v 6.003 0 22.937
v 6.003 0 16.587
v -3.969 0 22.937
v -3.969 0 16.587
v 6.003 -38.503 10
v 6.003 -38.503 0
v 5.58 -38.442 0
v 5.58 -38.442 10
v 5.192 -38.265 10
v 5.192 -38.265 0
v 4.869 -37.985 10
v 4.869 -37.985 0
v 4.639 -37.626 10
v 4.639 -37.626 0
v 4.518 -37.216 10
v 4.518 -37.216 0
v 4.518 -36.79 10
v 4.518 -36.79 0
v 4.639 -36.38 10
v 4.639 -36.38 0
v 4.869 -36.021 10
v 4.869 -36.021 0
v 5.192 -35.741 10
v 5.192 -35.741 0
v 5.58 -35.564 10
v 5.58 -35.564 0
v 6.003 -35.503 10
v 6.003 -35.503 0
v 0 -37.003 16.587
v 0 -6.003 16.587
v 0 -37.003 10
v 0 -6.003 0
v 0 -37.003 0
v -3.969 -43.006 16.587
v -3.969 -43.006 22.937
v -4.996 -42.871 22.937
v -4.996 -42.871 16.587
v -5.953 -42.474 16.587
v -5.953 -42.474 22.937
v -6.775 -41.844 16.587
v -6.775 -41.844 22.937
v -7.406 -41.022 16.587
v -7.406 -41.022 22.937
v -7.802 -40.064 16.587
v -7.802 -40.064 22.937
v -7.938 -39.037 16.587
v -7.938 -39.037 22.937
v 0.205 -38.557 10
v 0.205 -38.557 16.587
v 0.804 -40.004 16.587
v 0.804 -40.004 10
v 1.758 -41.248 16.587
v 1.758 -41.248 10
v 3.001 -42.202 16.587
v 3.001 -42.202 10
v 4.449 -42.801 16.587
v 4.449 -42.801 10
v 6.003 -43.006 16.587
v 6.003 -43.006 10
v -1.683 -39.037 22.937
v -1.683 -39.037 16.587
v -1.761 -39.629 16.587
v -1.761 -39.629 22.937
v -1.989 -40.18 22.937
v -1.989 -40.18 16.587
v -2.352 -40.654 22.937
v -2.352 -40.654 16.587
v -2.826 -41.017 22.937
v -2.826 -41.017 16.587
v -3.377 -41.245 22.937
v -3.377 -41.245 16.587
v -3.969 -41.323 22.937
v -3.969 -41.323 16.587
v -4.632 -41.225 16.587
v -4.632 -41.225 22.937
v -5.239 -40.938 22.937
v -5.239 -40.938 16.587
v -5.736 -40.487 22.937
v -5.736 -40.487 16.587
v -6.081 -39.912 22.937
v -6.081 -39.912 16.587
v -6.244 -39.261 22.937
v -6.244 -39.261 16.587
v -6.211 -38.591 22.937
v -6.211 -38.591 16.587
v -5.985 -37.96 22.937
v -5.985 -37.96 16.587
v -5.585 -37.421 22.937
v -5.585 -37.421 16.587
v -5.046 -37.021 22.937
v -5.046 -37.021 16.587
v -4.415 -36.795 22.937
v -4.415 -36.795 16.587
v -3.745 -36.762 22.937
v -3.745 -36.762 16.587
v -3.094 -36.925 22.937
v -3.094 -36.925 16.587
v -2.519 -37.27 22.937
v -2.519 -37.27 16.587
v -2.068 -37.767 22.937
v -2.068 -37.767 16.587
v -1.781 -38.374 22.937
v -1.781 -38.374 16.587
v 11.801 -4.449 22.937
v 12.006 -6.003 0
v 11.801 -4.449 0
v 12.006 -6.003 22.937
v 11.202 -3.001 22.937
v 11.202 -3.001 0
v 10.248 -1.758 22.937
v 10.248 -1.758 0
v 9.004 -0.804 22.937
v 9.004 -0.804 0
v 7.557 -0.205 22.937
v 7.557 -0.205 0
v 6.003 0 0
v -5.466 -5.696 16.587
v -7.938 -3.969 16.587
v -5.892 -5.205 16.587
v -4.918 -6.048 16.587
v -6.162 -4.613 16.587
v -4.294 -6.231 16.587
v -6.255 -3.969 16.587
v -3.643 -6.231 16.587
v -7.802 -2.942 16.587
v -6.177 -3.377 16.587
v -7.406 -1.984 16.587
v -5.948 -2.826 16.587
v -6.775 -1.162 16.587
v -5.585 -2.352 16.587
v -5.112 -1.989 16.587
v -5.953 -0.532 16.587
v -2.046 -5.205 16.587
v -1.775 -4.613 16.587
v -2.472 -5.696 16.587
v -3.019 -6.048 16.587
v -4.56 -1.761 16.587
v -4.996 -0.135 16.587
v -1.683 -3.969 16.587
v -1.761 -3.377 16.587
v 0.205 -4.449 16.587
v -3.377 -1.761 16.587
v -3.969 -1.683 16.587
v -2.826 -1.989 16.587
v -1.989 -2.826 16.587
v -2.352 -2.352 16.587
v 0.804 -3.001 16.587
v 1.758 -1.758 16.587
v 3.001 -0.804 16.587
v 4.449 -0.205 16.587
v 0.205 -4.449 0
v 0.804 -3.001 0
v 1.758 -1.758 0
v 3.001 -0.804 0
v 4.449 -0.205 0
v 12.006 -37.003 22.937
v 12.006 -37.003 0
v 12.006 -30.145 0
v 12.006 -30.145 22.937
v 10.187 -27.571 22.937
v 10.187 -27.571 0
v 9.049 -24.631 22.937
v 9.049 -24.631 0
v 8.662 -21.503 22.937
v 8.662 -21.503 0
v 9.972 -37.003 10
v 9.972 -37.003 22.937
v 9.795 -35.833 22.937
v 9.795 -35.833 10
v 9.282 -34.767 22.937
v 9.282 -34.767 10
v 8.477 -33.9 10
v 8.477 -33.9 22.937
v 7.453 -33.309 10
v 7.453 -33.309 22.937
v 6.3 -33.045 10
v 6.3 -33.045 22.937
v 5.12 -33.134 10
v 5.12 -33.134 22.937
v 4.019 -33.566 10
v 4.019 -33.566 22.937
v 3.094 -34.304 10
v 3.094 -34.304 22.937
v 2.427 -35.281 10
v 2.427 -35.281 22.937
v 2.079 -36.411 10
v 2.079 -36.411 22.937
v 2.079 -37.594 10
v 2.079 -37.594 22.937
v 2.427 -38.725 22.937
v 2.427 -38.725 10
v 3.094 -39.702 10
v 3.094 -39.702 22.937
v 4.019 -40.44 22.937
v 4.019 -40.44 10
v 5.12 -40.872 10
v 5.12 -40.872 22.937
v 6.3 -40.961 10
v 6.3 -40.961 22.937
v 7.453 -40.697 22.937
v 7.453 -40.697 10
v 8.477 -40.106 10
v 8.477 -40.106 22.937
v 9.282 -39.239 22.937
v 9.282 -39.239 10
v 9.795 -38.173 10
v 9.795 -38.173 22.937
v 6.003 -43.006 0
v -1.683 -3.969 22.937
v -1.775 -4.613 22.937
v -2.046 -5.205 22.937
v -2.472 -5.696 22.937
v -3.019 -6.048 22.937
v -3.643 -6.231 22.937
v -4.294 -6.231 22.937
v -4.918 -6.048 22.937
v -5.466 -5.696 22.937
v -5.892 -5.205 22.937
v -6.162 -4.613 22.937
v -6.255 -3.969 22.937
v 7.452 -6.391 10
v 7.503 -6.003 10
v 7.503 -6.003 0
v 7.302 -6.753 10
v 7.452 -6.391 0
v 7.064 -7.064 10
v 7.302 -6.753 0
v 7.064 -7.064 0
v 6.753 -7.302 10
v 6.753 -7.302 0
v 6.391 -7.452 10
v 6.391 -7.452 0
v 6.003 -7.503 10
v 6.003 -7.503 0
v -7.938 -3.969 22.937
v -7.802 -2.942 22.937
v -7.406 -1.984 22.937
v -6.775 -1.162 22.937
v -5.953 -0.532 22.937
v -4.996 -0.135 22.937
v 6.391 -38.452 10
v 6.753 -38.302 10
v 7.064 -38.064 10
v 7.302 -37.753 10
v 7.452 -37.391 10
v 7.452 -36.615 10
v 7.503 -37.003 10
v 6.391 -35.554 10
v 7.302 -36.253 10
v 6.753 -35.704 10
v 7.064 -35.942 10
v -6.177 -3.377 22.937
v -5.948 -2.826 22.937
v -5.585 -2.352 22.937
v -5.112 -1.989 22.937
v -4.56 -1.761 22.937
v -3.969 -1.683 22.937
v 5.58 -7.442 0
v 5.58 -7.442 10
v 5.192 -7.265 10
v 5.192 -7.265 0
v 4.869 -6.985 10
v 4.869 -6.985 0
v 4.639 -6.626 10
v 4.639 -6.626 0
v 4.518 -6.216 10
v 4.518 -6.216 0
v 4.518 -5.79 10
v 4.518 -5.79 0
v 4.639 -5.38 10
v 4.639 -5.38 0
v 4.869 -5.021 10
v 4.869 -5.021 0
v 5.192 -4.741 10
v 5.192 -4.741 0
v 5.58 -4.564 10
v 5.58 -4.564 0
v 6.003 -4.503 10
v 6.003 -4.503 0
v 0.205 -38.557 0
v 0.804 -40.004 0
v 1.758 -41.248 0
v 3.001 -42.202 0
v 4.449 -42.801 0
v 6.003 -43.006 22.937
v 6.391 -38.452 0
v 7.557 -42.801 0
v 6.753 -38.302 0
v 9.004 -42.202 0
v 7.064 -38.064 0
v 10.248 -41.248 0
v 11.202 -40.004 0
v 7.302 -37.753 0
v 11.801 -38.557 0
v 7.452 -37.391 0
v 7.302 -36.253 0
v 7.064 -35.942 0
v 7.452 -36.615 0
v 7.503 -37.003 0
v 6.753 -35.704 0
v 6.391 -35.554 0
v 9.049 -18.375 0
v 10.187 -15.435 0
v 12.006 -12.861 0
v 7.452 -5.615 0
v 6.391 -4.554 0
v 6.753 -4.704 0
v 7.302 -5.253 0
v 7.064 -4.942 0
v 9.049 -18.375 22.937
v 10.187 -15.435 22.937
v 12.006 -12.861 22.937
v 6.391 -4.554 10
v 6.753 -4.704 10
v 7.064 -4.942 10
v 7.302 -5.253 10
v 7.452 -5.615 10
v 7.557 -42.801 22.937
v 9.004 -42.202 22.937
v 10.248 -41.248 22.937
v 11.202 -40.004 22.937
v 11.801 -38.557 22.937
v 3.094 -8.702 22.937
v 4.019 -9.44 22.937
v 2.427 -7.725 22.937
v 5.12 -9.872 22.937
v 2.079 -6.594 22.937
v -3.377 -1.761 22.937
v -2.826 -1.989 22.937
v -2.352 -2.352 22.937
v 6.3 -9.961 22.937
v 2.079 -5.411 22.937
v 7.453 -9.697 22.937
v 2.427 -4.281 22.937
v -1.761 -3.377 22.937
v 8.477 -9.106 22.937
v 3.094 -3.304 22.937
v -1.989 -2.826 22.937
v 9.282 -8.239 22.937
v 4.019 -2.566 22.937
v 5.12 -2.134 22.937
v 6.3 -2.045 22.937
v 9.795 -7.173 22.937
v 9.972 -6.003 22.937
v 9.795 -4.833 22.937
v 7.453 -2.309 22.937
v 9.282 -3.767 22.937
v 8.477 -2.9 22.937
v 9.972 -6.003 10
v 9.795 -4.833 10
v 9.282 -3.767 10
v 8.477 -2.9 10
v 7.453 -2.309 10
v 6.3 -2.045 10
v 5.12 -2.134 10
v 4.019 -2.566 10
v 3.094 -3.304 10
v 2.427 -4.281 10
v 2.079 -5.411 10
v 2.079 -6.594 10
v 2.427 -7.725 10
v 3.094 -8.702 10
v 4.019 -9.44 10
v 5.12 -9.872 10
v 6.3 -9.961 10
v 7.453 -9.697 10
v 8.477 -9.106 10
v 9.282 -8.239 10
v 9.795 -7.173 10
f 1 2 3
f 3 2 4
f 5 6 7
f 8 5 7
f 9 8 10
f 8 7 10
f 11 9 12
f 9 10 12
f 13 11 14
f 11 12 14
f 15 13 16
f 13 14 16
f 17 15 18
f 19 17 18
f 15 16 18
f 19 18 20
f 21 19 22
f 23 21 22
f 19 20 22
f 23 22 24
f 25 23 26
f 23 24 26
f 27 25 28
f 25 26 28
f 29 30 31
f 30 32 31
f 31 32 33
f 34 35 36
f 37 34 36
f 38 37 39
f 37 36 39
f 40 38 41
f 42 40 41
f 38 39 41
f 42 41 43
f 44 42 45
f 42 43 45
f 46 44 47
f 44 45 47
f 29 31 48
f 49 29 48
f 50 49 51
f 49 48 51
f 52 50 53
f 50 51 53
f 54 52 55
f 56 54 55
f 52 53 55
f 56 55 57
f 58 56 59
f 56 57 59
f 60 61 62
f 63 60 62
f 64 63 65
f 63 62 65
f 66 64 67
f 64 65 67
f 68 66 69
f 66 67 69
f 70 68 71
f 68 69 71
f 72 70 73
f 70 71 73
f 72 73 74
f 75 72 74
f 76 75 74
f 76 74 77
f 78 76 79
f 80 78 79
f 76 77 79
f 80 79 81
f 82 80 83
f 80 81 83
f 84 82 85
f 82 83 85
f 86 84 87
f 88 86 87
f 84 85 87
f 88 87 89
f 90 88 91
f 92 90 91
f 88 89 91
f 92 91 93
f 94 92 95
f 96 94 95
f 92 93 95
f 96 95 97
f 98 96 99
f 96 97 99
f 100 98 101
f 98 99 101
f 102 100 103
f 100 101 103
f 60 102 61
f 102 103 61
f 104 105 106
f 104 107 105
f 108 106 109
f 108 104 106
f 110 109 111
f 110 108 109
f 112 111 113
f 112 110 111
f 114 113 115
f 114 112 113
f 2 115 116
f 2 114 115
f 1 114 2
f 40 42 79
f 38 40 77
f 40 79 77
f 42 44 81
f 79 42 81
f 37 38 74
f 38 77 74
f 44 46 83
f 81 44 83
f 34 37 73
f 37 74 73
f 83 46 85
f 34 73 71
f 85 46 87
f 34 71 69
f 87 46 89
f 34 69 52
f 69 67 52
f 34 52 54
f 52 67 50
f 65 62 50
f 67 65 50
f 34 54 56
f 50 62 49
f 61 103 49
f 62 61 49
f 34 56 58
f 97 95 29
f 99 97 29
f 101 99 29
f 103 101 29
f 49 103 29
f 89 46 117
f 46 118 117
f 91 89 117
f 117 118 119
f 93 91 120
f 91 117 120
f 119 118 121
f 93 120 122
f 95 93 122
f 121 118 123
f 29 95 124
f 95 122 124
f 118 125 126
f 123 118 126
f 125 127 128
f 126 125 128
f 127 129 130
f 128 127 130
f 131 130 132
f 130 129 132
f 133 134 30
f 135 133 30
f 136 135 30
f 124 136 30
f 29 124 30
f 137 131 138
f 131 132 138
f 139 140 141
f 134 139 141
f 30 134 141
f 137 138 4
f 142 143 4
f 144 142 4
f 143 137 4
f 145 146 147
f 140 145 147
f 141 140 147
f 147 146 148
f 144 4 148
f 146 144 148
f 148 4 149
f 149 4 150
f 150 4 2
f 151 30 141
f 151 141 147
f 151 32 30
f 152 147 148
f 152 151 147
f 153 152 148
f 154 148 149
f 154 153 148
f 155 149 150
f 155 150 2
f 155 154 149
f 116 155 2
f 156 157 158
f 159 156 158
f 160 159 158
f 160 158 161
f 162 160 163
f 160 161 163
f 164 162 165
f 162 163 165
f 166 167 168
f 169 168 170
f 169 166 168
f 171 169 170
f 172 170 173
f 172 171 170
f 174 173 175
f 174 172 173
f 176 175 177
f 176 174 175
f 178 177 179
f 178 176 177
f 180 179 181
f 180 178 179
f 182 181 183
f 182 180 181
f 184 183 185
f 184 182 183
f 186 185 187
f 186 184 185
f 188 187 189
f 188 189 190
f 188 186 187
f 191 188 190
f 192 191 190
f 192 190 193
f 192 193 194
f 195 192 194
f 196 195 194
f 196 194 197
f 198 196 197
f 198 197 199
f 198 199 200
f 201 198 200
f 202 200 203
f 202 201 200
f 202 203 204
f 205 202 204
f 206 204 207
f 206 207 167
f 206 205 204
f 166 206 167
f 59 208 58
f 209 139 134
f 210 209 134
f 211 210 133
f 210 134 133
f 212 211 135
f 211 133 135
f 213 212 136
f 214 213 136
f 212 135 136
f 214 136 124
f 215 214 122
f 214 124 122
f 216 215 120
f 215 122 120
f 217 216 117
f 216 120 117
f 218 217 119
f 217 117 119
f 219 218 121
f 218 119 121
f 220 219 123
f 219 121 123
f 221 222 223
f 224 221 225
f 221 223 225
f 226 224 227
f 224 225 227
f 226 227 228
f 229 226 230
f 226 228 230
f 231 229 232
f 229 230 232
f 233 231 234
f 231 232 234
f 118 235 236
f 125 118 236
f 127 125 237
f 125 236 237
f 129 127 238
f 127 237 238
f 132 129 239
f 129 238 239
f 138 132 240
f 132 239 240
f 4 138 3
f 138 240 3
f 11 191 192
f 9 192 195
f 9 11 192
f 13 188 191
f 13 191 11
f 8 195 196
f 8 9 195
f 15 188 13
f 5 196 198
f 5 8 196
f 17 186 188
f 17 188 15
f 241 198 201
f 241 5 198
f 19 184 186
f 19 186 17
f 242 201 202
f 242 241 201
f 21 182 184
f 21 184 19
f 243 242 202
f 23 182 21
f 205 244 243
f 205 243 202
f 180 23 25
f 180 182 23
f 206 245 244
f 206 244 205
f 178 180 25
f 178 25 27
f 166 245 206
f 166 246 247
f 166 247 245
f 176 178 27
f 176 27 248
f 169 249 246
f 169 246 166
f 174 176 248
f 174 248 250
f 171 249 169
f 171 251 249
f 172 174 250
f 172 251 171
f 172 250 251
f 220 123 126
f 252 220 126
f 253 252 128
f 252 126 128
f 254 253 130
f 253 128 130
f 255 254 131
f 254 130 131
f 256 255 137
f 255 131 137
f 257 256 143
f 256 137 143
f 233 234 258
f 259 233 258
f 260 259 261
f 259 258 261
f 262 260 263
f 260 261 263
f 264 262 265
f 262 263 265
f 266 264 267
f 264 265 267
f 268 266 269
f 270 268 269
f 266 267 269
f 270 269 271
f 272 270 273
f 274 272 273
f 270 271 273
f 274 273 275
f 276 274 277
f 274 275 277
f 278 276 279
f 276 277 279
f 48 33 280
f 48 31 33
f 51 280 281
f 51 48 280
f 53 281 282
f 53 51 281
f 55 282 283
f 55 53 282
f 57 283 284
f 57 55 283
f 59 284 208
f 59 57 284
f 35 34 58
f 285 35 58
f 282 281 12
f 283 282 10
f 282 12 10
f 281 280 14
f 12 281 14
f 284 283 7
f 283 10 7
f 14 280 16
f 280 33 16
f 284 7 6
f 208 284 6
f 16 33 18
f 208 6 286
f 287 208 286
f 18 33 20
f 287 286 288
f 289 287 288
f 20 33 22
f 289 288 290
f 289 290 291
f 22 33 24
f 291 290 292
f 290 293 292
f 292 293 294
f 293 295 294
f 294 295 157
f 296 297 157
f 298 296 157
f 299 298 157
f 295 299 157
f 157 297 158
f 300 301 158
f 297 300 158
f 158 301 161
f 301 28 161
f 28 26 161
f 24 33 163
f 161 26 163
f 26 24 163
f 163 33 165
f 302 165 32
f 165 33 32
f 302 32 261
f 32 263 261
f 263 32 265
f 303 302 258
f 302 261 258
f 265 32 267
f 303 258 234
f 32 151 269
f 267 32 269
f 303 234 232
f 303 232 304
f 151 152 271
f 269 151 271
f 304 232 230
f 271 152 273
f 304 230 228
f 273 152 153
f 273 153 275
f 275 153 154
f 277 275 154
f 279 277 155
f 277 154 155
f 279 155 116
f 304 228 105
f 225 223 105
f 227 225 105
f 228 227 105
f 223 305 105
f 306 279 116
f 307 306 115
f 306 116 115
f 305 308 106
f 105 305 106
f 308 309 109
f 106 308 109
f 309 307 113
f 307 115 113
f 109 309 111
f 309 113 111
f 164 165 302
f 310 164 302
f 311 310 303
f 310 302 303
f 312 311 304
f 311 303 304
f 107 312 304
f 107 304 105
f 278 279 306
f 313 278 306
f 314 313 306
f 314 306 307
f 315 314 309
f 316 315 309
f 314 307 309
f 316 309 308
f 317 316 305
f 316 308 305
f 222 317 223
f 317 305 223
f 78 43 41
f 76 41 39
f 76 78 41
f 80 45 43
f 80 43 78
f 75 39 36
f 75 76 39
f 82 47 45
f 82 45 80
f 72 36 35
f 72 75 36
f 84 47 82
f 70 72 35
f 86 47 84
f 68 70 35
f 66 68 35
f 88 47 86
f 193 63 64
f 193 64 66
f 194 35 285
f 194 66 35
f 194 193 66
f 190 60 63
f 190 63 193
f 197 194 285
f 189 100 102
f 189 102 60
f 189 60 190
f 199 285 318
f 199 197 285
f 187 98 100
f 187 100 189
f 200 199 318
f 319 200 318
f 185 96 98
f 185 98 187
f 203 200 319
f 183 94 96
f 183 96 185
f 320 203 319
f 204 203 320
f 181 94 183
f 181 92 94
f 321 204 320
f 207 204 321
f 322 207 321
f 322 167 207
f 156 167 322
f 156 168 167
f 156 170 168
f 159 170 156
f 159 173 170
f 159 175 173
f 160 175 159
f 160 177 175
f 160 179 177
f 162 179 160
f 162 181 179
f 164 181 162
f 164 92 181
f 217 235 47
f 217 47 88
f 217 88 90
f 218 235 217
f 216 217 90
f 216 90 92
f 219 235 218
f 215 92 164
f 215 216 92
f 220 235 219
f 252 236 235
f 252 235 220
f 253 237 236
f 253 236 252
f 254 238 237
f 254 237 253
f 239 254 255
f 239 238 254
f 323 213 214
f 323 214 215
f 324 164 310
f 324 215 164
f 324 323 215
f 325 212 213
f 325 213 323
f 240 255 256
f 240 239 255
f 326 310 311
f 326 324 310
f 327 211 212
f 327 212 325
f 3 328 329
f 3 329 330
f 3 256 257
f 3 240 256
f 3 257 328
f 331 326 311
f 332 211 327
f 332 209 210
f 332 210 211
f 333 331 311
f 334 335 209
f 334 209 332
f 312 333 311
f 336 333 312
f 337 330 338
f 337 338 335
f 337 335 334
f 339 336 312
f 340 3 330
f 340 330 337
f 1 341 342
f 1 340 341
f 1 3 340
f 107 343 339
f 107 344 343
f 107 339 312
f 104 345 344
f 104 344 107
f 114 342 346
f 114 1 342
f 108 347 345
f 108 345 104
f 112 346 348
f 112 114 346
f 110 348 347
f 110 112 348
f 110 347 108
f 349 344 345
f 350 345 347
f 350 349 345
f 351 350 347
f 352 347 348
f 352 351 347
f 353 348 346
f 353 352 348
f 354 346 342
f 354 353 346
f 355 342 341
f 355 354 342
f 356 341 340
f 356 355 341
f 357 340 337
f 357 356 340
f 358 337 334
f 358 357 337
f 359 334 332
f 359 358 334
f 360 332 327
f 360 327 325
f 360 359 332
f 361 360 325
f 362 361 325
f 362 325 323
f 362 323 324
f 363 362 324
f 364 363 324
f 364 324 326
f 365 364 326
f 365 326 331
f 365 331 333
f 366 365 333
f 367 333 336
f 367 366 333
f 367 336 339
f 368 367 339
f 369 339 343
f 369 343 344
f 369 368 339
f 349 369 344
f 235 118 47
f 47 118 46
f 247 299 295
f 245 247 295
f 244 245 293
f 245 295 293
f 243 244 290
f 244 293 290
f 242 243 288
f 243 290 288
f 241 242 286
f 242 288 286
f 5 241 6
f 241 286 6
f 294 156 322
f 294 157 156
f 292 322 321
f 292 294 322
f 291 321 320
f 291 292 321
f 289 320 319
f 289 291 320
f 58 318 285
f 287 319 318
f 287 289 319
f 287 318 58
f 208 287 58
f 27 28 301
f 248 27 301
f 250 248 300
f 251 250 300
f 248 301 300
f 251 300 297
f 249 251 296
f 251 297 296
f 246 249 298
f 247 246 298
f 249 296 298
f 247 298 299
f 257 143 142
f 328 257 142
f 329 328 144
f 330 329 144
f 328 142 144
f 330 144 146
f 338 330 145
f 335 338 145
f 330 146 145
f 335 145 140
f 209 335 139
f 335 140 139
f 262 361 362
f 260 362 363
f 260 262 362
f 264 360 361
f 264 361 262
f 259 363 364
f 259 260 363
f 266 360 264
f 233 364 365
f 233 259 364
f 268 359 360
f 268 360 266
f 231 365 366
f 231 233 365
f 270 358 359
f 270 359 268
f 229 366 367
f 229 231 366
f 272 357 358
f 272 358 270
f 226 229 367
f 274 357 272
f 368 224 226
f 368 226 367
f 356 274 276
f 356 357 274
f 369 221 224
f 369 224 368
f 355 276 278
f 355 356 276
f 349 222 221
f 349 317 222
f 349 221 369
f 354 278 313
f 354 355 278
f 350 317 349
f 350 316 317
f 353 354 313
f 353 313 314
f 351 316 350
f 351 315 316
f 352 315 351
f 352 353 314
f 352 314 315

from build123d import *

# Parameters (mm, degrees)
F1_DEPTH = 10
F2_R     = 3.96875
F3_DEPTH = 12.93749
F4_R     = 6.002975
F5_R     = 3.96875
F7_DEPTH = 22.93749
F8_DEPTH = 6.58749


# Not quite as in the source:
# - a fillet or chamfer is up to 0.001 mm smaller than in the source, because OpenCascade refuses the exact size


with BuildPart() as f1:
    # F0 (on Top) → F1 (new body)
    with BuildSketch(Plane.XY):
        Polygon((6.0029852, 0), (0, 0), (0, -43.0059592), (6.0029852, -43.0059592), (12.0059704, -43.0059592), (12.0059704, 0), align=None)
        with BuildLine():
            ThreePointArc((7.5029852, -37.002974), (7.0636453718, -38.0636341718), (6.0029852, -38.502974))
            ThreePointArc((6.0029852, -38.502974), (4.5029852, -37.002974), (6.0029852, -35.502974))
            ThreePointArc((6.0029852, -35.502974), (7.0636453718, -35.9423138282), (7.5029852, -37.002974))
        make_face(mode=Mode.SUBTRACT)
        with BuildLine():
            ThreePointArc((6.0029852, -7.5029852), (4.5029852, -6.0029852), (6.0029852, -4.5029852))
            ThreePointArc((6.0029852, -4.5029852), (7.0636453718, -4.9423250282), (7.5029852, -6.0029852))
            ThreePointArc((7.5029852, -6.0029852), (7.0636453718, -7.0636453718), (6.0029852, -7.5029852))
        make_face(mode=Mode.SUBTRACT)
    extrude(amount=F1_DEPTH)

    # F2 (on face) → F3 (join)
    with BuildSketch(Plane.XY.offset(10)):
        with BuildLine():
            Line((12.0059704, -43.0059592), (12.0059704, 0))
            Line((12.0059704, 0), (-3.96875, 0))
            Line((-3.96875, 0), (-3.96875, -1.68275))
            ThreePointArc((-3.96875, -1.68275), (-2.3523038982, -2.3523038982), (-1.68275, -3.96875))
            ThreePointArc((-1.68275, -3.96875), (-3.96875, -6.25475), (-6.25475, -3.96875))
            Line((-6.25475, -3.96875), (-7.9375, -3.96875))
            Line((-7.9375, -3.96875), (-7.9375, -43.0059592))
            Line((-7.9375, -43.0059592), (-3.96875, -43.0059592))
            Line((-3.96875, -43.0059592), (12.0059704, -43.0059592))
        make_face()
        with BuildLine():
            ThreePointArc((-1.68275, -39.0372092), (-2.3523038982, -40.6536553018), (-3.96875, -41.3232092))
            ThreePointArc((-3.96875, -41.3232092), (-5.5851961018, -37.4207630982), (-1.68275, -39.0372092))
        make_face(mode=Mode.SUBTRACT)
        with Locations((6.0029852, -37.002974)):
            Circle(F2_R, mode=Mode.SUBTRACT)
        with Locations((6.0029852, -6.0029852)):
            Circle(F2_R, mode=Mode.SUBTRACT)
        with BuildLine():
            Line((-3.96875, -1.68275), (-3.96875, 0))
            Line((-3.96875, 0), (-7.9375, 0))
            Line((-7.9375, 0), (-7.9375, -3.96875))
            Line((-7.9375, -3.96875), (-6.25475, -3.96875))
            ThreePointArc((-6.25475, -3.96875), (-5.5851961018, -2.3523038982), (-3.96875, -1.68275))
        make_face()
    extrude(amount=F3_DEPTH)

    # F4 (radius 6.0029852 in the source; OpenCascade refuses exactly that, so slightly less here)
    f4_edges = [f1.edges().sort_by_distance(p)[0] for p in [
        (12.00597, 0, 11.468745),
        (0, 0, 5),
        (0, -43.005959, 5),
        (12.00597, -43.005959, 11.468745),
    ]]
    fillet(f4_edges, radius=F4_R)

    # F5
    f5_edges = [f1.edges().sort_by_distance(p)[0] for p in [
        (-7.9375, -43.005959, 16.468745),
        (-7.9375, 0, 16.468745),
    ]]
    fillet(f5_edges, radius=F5_R)

    # F6 (on face) → F7 (cut, through all)
    with BuildSketch(Plane(origin=(0, 0, 0), x_dir=(1, 0, 0), z_dir=(0, 0, -1))):
        with BuildLine():
            ThreePointArc((12.0059704, 30.145029001), (9.5274974569, 26.1361174223), (8.6624922, 21.5029796))
            Line((8.6624922, 21.5029796), (12.0059704, 21.5029796))
            Line((12.0059704, 21.5029796), (12.0059704, 30.145029001))
        make_face()
        with BuildLine():
            Line((12.0059704, 21.5029796), (8.6624922, 21.5029796))
            ThreePointArc((8.6624922, 21.5029796), (9.5274974569, 16.8698417777), (12.0059704, 12.860930199))
            Line((12.0059704, 12.860930199), (12.0059704, 21.5029796))
        make_face()
    extrude(amount=-F7_DEPTH, mode=Mode.SUBTRACT)

    # F8 (cut): a face of the model
    f8_faces = [f1.faces().sort_by_distance(p)[0] for p in [
        (-3.6441940758, -21.5029796, 10),
    ]]
    extrude(f8_faces, amount=-F8_DEPTH, mode=Mode.SUBTRACT)


solid = f1.part
